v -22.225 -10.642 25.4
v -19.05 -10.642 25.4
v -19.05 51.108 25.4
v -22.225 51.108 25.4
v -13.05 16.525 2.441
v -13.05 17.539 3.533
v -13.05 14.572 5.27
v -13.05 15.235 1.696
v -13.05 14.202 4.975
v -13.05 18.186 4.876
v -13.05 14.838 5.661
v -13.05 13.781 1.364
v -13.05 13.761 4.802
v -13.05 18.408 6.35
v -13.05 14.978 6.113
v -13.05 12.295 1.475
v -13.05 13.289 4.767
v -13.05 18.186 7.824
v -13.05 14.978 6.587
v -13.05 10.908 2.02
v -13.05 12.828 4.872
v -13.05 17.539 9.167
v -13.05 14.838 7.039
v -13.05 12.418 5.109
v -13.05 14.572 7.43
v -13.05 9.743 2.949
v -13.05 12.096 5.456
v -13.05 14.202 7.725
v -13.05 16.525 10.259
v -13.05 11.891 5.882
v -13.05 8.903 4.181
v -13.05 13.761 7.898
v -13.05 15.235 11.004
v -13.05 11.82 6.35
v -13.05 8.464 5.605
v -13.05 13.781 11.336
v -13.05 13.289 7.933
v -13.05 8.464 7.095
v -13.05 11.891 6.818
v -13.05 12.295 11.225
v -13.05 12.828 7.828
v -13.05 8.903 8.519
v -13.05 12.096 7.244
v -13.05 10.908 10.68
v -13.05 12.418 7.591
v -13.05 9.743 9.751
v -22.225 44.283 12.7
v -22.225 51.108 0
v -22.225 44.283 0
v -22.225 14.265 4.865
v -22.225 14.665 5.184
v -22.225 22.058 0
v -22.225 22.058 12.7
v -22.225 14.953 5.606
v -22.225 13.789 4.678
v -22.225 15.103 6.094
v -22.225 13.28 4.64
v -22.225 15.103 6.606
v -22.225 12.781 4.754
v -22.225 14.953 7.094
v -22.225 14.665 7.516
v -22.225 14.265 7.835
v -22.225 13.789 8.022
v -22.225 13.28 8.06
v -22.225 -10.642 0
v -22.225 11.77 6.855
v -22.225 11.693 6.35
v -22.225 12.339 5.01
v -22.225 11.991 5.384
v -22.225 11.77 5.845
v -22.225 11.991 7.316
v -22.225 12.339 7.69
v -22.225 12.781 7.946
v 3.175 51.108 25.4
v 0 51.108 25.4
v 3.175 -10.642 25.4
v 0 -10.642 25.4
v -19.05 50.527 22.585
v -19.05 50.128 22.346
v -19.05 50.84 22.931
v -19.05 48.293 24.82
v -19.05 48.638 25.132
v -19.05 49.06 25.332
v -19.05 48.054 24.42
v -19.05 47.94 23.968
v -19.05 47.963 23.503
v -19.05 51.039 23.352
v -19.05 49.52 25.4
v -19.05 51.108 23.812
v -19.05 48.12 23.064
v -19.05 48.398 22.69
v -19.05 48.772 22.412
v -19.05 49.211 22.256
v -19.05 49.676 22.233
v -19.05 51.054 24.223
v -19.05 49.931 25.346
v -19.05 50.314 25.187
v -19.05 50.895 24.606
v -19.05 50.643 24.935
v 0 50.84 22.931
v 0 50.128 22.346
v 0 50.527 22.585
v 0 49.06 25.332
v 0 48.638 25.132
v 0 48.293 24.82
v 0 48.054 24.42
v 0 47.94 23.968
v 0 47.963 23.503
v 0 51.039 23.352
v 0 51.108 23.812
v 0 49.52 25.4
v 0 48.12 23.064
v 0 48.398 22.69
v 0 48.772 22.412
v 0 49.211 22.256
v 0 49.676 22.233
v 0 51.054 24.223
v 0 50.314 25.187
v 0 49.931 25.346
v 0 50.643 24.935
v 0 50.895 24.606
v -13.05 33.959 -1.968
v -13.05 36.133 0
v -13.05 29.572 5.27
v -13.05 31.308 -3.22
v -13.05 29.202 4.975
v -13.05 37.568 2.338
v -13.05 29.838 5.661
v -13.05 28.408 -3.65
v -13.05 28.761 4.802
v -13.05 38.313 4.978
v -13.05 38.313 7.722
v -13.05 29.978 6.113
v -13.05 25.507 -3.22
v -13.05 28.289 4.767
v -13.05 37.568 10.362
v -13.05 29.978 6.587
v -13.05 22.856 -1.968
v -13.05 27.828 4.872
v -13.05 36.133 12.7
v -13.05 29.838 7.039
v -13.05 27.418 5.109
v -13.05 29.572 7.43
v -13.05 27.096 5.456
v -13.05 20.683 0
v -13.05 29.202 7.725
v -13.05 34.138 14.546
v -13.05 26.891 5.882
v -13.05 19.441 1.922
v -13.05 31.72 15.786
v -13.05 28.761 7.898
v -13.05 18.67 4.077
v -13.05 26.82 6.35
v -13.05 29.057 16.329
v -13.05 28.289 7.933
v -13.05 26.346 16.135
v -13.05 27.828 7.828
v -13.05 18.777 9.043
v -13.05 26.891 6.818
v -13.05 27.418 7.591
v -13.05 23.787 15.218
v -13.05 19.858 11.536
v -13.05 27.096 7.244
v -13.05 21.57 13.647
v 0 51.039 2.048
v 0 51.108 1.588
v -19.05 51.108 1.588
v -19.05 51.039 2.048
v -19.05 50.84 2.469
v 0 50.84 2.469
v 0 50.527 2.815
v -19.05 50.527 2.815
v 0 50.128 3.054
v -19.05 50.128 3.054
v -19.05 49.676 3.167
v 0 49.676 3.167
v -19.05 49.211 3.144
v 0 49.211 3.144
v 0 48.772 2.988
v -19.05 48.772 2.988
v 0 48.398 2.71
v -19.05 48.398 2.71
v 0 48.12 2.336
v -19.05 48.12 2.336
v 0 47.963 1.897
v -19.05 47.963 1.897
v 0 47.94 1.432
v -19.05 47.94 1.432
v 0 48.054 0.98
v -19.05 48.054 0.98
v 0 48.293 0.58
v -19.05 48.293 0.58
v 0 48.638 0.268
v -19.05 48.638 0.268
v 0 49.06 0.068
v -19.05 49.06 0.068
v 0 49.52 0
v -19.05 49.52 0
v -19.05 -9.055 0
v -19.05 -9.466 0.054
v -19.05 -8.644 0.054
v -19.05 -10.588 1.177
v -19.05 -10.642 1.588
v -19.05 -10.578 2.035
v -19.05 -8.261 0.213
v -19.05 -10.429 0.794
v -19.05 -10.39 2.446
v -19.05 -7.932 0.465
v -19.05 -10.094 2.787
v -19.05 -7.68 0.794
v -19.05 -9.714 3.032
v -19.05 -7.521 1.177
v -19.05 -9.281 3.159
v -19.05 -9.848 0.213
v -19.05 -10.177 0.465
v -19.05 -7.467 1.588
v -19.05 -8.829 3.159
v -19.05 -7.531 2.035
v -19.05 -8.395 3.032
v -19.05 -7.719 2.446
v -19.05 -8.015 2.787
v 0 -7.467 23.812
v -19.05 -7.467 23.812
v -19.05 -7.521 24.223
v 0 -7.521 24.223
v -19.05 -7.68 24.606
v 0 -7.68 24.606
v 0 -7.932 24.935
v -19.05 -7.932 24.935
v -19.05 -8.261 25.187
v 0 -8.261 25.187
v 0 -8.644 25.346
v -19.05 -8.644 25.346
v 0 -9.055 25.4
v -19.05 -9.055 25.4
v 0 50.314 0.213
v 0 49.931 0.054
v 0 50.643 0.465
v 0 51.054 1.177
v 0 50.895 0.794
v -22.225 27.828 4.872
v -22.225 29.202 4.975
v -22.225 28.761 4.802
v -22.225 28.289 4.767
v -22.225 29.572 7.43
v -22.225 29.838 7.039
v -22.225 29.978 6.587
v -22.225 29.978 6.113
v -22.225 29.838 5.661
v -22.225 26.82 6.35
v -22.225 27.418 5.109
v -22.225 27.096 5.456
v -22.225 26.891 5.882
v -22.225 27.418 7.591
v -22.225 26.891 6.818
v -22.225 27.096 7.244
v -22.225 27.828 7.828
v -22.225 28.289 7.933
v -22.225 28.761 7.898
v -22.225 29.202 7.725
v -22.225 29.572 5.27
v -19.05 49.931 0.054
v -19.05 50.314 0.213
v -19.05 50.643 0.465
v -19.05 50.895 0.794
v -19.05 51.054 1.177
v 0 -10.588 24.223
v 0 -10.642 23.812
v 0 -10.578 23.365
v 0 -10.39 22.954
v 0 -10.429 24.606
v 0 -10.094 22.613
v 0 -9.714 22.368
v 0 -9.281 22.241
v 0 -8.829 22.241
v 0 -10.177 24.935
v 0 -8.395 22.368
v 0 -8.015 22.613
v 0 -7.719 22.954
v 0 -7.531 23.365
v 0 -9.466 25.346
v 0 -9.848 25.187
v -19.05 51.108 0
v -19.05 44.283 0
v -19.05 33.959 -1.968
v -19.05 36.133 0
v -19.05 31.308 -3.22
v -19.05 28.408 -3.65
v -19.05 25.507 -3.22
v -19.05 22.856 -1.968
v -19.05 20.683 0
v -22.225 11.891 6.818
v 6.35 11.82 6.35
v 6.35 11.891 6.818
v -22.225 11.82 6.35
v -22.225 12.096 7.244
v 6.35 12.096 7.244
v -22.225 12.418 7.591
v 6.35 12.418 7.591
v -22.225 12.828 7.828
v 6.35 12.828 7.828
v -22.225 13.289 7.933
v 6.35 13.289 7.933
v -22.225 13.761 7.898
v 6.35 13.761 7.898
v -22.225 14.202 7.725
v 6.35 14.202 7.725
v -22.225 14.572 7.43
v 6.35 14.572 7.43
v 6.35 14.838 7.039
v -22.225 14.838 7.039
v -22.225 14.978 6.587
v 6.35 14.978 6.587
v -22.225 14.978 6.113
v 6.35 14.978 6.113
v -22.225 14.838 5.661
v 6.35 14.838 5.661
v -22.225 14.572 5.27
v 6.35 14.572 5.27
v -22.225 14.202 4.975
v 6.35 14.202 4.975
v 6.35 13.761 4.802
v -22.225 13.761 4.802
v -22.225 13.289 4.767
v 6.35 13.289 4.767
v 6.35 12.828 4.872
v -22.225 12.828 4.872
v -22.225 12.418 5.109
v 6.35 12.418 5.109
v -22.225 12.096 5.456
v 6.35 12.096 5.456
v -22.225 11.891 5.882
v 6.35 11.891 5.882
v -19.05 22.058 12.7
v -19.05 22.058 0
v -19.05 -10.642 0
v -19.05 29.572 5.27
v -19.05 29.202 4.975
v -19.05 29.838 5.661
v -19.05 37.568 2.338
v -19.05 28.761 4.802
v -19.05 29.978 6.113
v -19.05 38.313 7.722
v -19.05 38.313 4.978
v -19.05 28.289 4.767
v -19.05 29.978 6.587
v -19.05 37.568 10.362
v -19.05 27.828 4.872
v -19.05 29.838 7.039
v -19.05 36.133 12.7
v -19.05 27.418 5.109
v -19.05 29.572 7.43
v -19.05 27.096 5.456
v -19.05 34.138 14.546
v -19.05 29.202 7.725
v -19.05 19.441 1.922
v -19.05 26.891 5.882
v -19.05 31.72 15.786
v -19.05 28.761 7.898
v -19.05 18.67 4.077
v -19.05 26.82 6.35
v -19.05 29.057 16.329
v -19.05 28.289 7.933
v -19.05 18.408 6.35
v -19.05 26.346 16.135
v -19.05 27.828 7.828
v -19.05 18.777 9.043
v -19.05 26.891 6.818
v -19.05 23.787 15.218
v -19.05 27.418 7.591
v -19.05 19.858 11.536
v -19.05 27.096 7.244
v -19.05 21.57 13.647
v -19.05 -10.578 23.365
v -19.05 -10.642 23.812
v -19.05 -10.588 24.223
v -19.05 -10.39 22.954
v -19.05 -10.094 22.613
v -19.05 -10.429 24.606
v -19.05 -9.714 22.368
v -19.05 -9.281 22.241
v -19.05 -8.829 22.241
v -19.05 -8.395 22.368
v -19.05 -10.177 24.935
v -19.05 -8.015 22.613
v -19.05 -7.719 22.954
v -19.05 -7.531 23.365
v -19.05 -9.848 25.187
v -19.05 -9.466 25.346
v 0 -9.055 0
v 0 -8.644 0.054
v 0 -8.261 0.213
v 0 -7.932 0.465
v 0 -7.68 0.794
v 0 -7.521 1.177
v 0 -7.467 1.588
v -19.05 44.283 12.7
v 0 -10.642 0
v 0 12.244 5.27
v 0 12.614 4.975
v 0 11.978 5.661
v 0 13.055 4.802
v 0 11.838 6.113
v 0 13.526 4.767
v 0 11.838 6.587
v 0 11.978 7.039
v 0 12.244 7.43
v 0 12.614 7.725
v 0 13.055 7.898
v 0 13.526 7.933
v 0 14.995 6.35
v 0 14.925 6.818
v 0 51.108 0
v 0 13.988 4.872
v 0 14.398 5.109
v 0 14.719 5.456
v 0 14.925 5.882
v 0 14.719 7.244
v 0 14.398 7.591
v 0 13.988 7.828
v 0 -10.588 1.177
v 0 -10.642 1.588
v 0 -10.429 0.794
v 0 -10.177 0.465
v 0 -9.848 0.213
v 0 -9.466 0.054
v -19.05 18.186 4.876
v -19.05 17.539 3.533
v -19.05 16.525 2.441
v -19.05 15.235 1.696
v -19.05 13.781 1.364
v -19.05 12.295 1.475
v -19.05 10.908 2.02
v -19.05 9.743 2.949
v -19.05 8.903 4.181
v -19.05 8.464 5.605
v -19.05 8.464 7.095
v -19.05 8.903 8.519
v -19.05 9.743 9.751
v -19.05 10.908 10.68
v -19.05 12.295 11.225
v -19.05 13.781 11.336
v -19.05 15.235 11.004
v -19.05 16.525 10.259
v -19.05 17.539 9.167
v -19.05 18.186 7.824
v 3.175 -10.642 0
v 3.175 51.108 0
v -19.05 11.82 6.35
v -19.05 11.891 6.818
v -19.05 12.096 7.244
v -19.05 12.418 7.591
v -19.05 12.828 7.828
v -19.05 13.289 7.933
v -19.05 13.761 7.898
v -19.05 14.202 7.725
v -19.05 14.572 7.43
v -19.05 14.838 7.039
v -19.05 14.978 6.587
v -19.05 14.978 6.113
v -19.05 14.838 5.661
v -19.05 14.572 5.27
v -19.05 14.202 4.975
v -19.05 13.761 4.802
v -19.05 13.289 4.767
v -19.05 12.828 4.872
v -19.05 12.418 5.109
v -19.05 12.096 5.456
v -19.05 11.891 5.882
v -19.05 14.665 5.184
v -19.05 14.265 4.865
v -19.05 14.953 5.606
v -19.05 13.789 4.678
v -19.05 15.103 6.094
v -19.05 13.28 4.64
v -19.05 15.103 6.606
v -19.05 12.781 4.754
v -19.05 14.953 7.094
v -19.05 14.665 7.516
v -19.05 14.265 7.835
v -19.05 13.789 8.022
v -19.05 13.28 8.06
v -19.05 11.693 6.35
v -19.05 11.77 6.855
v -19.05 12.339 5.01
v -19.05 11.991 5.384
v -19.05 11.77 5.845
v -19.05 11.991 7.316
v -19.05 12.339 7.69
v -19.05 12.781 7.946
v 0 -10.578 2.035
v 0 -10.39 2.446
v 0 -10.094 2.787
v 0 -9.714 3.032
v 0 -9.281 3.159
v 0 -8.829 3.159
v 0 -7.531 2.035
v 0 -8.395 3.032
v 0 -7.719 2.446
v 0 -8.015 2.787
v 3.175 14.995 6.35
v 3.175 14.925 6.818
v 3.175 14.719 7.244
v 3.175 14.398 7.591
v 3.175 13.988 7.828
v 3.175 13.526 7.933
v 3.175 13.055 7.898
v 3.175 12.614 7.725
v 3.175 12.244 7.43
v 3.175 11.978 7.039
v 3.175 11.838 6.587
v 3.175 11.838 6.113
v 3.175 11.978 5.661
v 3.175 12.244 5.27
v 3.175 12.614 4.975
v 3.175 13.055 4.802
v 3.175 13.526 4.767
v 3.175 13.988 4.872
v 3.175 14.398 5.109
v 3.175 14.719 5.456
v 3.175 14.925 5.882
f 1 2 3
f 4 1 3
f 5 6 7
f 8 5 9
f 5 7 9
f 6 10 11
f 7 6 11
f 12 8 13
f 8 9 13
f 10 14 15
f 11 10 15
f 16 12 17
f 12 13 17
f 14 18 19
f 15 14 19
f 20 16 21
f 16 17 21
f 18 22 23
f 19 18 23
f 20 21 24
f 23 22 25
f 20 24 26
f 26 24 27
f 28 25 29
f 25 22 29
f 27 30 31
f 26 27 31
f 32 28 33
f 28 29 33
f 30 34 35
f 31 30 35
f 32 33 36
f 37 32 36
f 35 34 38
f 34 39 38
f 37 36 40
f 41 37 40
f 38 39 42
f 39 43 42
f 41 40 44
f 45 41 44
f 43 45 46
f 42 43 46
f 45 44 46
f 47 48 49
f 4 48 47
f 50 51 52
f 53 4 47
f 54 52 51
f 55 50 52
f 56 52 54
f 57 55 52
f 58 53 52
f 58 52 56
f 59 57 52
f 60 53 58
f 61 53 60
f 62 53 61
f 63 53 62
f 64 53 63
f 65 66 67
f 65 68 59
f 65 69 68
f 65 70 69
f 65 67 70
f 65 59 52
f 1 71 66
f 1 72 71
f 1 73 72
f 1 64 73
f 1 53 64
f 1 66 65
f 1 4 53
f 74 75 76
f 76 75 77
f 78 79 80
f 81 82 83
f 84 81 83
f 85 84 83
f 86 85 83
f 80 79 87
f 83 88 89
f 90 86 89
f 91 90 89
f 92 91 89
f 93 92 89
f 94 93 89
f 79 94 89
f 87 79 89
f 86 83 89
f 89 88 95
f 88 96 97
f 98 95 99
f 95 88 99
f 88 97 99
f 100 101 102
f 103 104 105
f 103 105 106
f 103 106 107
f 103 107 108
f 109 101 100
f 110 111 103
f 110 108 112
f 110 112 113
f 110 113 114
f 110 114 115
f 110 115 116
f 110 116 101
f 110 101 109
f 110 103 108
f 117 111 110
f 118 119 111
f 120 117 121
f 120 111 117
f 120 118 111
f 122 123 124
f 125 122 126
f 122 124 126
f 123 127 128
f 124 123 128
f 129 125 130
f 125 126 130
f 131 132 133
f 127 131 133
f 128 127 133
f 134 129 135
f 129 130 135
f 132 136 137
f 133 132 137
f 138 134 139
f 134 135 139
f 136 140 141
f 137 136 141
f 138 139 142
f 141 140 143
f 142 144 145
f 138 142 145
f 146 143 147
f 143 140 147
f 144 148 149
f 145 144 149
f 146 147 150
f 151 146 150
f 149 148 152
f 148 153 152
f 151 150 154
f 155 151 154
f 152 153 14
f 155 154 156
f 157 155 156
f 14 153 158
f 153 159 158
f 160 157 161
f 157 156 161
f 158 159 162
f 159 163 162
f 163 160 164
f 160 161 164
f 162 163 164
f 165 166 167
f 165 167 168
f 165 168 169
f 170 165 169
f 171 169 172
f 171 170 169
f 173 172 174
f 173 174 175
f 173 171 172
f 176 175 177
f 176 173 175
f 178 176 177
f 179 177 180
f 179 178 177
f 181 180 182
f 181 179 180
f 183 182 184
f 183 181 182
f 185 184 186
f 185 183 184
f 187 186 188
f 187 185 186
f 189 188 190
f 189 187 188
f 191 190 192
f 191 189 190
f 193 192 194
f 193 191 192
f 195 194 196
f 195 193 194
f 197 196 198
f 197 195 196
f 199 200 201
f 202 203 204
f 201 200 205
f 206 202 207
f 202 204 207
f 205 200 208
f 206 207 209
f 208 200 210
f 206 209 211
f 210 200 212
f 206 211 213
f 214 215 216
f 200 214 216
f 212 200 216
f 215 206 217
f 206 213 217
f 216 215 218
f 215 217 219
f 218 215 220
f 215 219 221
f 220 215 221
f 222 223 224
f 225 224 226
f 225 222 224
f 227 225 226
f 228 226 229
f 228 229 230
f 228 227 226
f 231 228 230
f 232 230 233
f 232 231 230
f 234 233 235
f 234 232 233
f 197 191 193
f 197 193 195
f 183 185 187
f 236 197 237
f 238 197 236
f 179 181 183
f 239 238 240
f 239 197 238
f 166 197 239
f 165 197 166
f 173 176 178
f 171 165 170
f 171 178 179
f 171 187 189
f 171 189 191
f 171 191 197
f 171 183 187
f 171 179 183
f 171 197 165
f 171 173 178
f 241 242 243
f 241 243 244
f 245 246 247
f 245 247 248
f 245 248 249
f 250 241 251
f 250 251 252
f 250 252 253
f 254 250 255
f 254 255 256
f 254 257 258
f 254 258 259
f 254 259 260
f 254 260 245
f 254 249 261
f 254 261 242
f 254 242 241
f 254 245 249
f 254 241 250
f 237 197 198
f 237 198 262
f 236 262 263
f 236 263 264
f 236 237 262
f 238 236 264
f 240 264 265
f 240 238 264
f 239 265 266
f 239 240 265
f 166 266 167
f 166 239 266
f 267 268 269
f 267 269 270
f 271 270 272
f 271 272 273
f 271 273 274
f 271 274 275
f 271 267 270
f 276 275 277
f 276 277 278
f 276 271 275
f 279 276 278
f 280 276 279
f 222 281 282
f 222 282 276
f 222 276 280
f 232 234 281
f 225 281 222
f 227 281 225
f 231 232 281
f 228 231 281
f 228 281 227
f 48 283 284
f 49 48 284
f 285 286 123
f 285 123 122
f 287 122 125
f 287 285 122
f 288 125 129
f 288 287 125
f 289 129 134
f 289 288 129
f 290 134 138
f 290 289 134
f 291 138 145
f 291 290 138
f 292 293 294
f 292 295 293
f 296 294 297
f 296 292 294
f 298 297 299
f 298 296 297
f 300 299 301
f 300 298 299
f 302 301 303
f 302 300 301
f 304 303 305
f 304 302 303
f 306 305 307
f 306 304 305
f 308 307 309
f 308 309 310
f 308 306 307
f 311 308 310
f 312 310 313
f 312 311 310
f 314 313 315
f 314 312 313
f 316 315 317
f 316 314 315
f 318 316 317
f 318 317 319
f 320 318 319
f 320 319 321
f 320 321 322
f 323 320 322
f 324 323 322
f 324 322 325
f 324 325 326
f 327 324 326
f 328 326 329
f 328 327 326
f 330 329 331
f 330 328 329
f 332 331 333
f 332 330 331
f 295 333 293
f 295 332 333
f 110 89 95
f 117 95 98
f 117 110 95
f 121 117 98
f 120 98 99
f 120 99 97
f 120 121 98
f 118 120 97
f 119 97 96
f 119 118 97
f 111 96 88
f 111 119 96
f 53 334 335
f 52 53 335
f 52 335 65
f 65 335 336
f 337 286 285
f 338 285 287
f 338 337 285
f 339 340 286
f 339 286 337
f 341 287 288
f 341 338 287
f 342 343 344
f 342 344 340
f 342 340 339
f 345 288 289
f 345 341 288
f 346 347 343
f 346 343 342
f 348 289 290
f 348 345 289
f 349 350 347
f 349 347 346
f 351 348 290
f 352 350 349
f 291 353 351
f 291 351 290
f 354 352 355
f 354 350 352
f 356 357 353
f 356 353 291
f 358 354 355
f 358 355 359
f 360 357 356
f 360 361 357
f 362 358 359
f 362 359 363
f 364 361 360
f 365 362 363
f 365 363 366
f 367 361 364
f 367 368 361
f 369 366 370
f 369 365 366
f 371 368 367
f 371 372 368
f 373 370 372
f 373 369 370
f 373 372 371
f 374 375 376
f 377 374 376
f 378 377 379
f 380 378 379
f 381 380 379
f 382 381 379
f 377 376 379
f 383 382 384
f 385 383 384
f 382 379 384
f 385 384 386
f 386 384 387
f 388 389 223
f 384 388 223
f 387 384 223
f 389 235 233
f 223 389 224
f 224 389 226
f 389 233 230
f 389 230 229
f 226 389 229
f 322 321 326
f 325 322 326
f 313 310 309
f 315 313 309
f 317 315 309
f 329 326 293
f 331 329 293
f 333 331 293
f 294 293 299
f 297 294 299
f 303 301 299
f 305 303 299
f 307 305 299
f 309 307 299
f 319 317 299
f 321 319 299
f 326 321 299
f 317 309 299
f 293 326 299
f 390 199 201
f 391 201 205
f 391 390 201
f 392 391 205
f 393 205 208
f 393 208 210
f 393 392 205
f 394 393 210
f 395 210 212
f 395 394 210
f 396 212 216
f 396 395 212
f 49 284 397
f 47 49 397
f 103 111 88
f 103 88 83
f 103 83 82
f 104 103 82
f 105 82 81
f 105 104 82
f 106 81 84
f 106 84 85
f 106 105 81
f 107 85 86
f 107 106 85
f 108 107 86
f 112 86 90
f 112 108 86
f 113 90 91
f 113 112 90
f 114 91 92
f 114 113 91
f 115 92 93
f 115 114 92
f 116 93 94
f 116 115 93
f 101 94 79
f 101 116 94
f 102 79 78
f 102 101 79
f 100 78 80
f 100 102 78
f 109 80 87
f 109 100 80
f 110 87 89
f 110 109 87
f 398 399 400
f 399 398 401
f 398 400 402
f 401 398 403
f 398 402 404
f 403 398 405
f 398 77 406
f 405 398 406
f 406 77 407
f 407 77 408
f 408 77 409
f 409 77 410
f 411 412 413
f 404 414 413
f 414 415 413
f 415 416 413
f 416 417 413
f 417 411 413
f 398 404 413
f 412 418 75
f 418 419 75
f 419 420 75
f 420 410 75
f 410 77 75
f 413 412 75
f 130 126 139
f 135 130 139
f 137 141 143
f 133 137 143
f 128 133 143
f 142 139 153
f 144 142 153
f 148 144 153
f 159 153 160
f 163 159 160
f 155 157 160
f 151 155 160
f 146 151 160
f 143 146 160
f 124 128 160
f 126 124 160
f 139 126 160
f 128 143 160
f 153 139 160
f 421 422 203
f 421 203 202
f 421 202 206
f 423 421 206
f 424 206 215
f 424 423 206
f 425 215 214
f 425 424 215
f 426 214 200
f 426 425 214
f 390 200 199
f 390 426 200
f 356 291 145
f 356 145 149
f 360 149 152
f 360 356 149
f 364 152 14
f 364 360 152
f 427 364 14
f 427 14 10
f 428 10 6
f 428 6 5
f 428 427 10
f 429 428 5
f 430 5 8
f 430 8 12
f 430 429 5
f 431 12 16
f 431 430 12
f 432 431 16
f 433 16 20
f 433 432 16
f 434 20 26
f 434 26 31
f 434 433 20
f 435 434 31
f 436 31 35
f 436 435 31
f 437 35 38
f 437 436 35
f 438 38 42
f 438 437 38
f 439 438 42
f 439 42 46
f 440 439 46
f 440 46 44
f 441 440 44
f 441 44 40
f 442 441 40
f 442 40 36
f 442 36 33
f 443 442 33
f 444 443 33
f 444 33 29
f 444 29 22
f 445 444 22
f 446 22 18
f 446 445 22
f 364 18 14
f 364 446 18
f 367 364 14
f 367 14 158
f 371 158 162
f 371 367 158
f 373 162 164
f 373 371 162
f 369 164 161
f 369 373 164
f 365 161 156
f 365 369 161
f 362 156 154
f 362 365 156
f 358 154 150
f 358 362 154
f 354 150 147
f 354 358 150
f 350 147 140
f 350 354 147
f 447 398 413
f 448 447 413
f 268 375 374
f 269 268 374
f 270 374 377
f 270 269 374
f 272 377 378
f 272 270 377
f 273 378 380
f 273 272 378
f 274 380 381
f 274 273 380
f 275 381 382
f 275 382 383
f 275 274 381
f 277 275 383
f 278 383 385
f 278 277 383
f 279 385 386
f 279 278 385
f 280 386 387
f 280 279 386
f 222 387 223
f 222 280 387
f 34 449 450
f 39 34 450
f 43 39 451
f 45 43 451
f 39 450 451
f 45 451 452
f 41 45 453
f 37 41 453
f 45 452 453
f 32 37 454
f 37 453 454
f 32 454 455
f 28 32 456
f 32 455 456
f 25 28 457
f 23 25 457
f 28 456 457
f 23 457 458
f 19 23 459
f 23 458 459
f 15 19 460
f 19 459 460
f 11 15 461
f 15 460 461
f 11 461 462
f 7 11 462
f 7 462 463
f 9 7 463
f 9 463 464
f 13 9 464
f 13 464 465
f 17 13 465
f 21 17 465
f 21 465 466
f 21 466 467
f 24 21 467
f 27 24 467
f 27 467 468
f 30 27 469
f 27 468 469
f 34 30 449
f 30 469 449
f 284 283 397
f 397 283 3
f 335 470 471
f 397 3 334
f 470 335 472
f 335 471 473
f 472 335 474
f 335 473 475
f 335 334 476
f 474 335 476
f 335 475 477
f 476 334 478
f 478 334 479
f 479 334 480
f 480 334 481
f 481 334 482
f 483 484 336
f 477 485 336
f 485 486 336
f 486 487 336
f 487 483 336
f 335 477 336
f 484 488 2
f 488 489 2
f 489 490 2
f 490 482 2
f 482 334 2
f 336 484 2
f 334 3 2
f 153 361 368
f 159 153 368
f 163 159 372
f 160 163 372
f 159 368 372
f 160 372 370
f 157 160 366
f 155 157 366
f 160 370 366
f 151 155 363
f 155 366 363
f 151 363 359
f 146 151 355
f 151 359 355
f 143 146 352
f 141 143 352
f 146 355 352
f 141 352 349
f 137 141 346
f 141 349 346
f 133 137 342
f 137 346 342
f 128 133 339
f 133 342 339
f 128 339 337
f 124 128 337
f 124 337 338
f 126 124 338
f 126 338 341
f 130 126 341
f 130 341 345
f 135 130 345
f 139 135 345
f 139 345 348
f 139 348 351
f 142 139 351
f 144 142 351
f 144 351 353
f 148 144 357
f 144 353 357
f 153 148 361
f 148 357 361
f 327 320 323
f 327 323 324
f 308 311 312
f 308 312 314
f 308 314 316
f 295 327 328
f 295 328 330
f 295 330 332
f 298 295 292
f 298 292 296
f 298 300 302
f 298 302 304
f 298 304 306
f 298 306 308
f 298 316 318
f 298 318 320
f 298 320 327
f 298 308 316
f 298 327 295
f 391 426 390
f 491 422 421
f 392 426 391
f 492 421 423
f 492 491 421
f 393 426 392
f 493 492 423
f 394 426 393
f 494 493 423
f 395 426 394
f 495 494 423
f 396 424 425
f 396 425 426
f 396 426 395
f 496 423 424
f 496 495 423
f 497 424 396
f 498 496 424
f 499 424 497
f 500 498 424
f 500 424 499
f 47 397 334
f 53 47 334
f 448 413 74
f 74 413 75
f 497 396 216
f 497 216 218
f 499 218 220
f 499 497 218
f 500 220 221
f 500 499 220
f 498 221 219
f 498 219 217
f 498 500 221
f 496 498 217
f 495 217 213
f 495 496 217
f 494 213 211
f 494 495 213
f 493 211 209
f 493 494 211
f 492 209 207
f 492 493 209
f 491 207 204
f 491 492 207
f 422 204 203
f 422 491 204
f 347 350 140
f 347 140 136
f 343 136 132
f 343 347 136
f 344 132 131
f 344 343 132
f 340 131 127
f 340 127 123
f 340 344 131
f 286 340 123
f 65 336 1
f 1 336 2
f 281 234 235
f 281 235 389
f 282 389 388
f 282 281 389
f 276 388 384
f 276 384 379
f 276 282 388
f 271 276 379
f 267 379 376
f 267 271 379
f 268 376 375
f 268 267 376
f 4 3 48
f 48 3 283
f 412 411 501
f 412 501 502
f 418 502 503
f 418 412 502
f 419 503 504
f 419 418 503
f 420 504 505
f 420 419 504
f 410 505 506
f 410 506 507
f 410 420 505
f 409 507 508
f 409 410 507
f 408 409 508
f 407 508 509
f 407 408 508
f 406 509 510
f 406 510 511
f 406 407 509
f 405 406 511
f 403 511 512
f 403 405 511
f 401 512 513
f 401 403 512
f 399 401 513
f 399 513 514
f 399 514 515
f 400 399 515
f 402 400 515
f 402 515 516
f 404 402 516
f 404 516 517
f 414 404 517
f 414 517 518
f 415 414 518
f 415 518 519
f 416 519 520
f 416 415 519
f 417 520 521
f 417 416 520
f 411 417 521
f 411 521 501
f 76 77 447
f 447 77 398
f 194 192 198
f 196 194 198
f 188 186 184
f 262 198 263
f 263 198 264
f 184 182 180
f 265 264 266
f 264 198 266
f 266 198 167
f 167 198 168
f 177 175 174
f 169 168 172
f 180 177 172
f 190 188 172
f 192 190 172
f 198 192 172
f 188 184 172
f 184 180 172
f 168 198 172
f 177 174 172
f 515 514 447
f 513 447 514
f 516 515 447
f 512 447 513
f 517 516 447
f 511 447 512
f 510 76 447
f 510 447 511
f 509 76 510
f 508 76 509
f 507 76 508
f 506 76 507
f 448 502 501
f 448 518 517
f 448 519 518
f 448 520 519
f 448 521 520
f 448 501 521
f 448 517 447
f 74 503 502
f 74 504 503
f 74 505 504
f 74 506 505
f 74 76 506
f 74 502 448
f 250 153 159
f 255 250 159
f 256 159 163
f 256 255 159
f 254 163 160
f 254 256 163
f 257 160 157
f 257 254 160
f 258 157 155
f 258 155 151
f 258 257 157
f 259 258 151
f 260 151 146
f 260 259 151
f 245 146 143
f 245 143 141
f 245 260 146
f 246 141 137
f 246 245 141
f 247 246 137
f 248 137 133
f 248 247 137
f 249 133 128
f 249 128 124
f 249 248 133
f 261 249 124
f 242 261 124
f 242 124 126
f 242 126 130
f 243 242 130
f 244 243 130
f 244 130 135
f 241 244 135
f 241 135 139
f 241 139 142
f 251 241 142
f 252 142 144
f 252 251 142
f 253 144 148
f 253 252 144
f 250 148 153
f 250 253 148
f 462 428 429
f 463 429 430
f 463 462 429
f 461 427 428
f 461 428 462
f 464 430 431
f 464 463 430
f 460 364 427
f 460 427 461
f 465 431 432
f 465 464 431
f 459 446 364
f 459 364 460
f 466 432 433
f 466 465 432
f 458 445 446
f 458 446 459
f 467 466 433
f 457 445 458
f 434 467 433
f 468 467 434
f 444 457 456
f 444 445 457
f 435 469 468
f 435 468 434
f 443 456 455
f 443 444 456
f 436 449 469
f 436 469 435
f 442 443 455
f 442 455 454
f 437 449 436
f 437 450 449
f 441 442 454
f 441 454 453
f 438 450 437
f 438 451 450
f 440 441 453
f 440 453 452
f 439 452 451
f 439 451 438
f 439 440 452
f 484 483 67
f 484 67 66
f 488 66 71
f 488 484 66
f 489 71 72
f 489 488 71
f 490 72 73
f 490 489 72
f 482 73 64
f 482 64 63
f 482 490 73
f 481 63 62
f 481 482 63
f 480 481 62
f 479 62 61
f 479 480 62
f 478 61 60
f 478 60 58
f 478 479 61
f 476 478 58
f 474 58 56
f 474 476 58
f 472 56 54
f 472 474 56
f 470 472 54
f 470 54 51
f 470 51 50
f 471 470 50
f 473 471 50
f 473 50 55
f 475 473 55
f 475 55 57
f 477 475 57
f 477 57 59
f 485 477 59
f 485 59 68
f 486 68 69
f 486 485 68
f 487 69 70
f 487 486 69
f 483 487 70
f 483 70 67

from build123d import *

# Parameters (mm, degrees)
F0_R      = 5
F0_R_2    = 1.8415
F0_R_3    = 1.5875
F1_DEPTH  = 3.175
F2_DEPTH  = 19.05
F3_R      = 1.7145
F4_DEPTH  = 3.175
F3_R_2    = 1.5875
F5_DEPTH  = 3.175
F6_DEPTH  = 6
F3_R_3    = 1.8415
F7_DEPTH  = 6
F8_DEPTH  = 3.175
F9_DEPTH  = 25.4
F10_DEPTH = 6


# Not quite as in the source:
# - a feature names something its author has since deleted; it is built from what else it names


with BuildPart() as f1:
    # F0 (on Right) → F1 (new body)
    with BuildSketch(Plane.YZ):
        with BuildLine():
            ThreePointArc((18.4078367749, 6.35), (25.0352423421, 15.7641174197), (36.1329581332, 12.7))
            Line((36.1329581332, 12.7), (44.2828367749, 12.7))
            Line((44.2828367749, 12.7), (44.2828367749, 0))
            Line((44.2828367749, 0), (49.5203367749, 0))
            ThreePointArc((49.5203367749, 0), (48.3978047598, 2.7100320151), (51.1078367749, 1.5875))
            Line((51.1078367749, 1.5875), (51.1078367749, 23.8125))
            ThreePointArc((51.1078367749, 23.8125), (48.3978047598, 22.6899679849), (49.5203367749, 25.4))
            Line((49.5203367749, 25.4), (41.8216693056, 25.4))
            Line((41.8216693056, 25.4), (35.8211970083, 25.4))
            Line((35.8211970083, 25.4), (-9.0546632251, 25.4))
            ThreePointArc((-9.0546632251, 25.4), (-7.9321312099, 24.9350320151), (-7.4671632251, 23.8125))
            ThreePointArc((-7.4671632251, 23.8125), (-9.0546632251, 22.225), (-10.6421632251, 23.8125))
            Line((-10.6421632251, 23.8125), (-10.6421632251, 1.5875))
            ThreePointArc((-10.6421632251, 1.5875), (-9.0546632251, 3.175), (-7.4671632251, 1.5875))
            ThreePointArc((-7.4671632251, 1.5875), (-7.9321312099, 0.4649679849), (-9.0546632251, 0))
            Line((-9.0546632251, 0), (20.6827154167, 0))
            ThreePointArc((20.6827154167, 0), (18.9937193553, 2.9774055671), (18.4078367749, 6.35))
        make_face()
        with Locations((13.4078367749, 6.35)):
            Circle(F0_R, mode=Mode.SUBTRACT)
        with BuildLine():
            ThreePointArc((36.1329581332, 0), (37.8219541946, 2.9774055671), (38.4078367749, 6.35))
            ThreePointArc((38.4078367749, 6.35), (37.8219541946, 9.7225944329), (36.1329581332, 12.7))
            Line((36.1329581332, 12.7), (22.0578367749, 12.7))
            Line((22.0578367749, 12.7), (22.0578367749, 0))
            Line((22.0578367749, 0), (36.1329581332, 0))
        make_face()
        with Locations((28.4078367749, 6.35)):
            Circle(F0_R_2, mode=Mode.SUBTRACT)
        with BuildLine():
            ThreePointArc((36.1329581332, 12.7), (37.8219541946, 9.7225944329), (38.4078367749, 6.35))
            ThreePointArc((38.4078367749, 6.35), (37.8219541946, 2.9774055671), (36.1329581332, 0))
            Line((36.1329581332, 0), (43.4878367749, 0))
            Line((43.4878367749, 0), (44.2828367749, 0))
            Line((44.2828367749, 0), (44.2828367749, 12.7))
            Line((44.2828367749, 12.7), (36.1329581332, 12.7))
        make_face()
        with Locations((13.4078367749, 6.35)):
            Circle(F0_R)
        with Locations((13.4078367749, 6.35)):
            Circle(F0_R_3, mode=Mode.SUBTRACT)
        with BuildLine():
            Line((22.0578367749, 12.7), (36.1329581332, 12.7))
            ThreePointArc((36.1329581332, 12.7), (25.0352423421, 15.7641174197), (18.4078367749, 6.35))
            ThreePointArc((18.4078367749, 6.35), (18.9937193553, 2.9774055671), (20.6827154167, 0))
            Line((20.6827154167, 0), (22.0578367749, 0))
            Line((22.0578367749, 0), (22.0578367749, 12.7))
        make_face()
        with Locations((28.4078367749, 6.35)):
            Circle(F0_R_2)
        with Locations((28.4078367749, 6.35)):
            Circle(F0_R_3, mode=Mode.SUBTRACT)
        with BuildLine():
            ThreePointArc((-10.6421632251, 1.5875), (-10.1771952402, 0.4649679849), (-9.0546632251, 0))
            ThreePointArc((-9.0546632251, 0), (-7.9321312099, 0.4649679849), (-7.4671632251, 1.5875))
            ThreePointArc((-7.4671632251, 1.5875), (-9.0546632251, 3.175), (-10.6421632251, 1.5875))
        make_face()
        with BuildLine():
            ThreePointArc((51.1078367749, 1.5875), (48.3978047598, 2.7100320151), (49.5203367749, 0))
            ThreePointArc((49.5203367749, 0), (50.6428687901, 0.4649679849), (51.1078367749, 1.5875))
        make_face()
        with BuildLine():
            ThreePointArc((-9.0546632251, 25.4), (-10.1771952402, 24.9350320151), (-10.6421632251, 23.8125))
            ThreePointArc((-10.6421632251, 23.8125), (-9.0546632251, 22.225), (-7.4671632251, 23.8125))
            ThreePointArc((-7.4671632251, 23.8125), (-7.9321312099, 24.9350320151), (-9.0546632251, 25.4))
        make_face()
        with BuildLine():
            ThreePointArc((49.5203367749, 25.4), (48.3978047598, 22.6899679849), (51.1078367749, 23.8125))
            ThreePointArc((51.1078367749, 23.8125), (50.6428687901, 24.9350320151), (49.5203367749, 25.4))
        make_face()
        with Locations((28.4078367749, 6.35)):
            Circle(F0_R_3)
        with BuildLine():
            Line((-10.6421632251, 0), (-9.0546632251, 0))
            ThreePointArc((-9.0546632251, 0), (-10.1771952402, 0.4649679849), (-10.6421632251, 1.5875))
            Line((-10.6421632251, 1.5875), (-10.6421632251, 0))
        make_face()
        with BuildLine():
            ThreePointArc((51.1078367749, 1.5875), (50.6428687901, 0.4649679849), (49.5203367749, 0))
            Line((49.5203367749, 0), (50.2833090723, 0))
            Line((50.2833090723, 0), (51.1078367749, 0))
            Line((51.1078367749, 0), (51.1078367749, 1.5875))
        make_face()
        with BuildLine():
            Line((-10.6421632251, 25.4), (-10.6421632251, 23.8125))
            ThreePointArc((-10.6421632251, 23.8125), (-10.1771952402, 24.9350320151), (-9.0546632251, 25.4))
            Line((-9.0546632251, 25.4), (-10.6421632251, 25.4))
        make_face()
        with BuildLine():
            ThreePointArc((49.5203367749, 25.4), (50.6428687901, 24.9350320151), (51.1078367749, 23.8125))
            Line((51.1078367749, 23.8125), (51.1078367749, 25.4))
            Line((51.1078367749, 25.4), (49.5203367749, 25.4))
        make_face()
    extrude(amount=F1_DEPTH)


with BuildPart() as f2:
    # F0 (on Right) → F2 (new body)
    with BuildSketch(Plane.YZ):
        with BuildLine():
            ThreePointArc((-10.6421632251, 1.5875), (-10.1771952402, 0.4649679849), (-9.0546632251, 0))
            ThreePointArc((-9.0546632251, 0), (-7.9321312099, 0.4649679849), (-7.4671632251, 1.5875))
            ThreePointArc((-7.4671632251, 1.5875), (-9.0546632251, 3.175), (-10.6421632251, 1.5875))
        make_face()
    extrude(amount=-F2_DEPTH)


with BuildPart() as f2b:
    # F0 (on Right) → F2, piece 2 (new body)
    with BuildSketch(Plane.YZ):
        with BuildLine():
            ThreePointArc((51.1078367749, 1.5875), (48.3978047598, 2.7100320151), (49.5203367749, 0))
            ThreePointArc((49.5203367749, 0), (50.6428687901, 0.4649679849), (51.1078367749, 1.5875))
        make_face()
    extrude(amount=-F2_DEPTH)


with BuildPart() as f2c:
    # F0 (on Right) → F2, piece 3 (new body)
    with BuildSketch(Plane.YZ):
        with BuildLine():
            ThreePointArc((-9.0546632251, 25.4), (-10.1771952402, 24.9350320151), (-10.6421632251, 23.8125))
            ThreePointArc((-10.6421632251, 23.8125), (-9.0546632251, 22.225), (-7.4671632251, 23.8125))
            ThreePointArc((-7.4671632251, 23.8125), (-7.9321312099, 24.9350320151), (-9.0546632251, 25.4))
        make_face()
    extrude(amount=-F2_DEPTH)


with BuildPart() as f2d:
    # F0 (on Right) → F2, piece 4 (new body)
    with BuildSketch(Plane.YZ):
        with BuildLine():
            ThreePointArc((49.5203367749, 25.4), (48.3978047598, 22.6899679849), (51.1078367749, 23.8125))
            ThreePointArc((51.1078367749, 23.8125), (50.6428687901, 24.9350320151), (49.5203367749, 25.4))
        make_face()
    extrude(amount=-F2_DEPTH)


with BuildPart() as f4:
    # F3 (on face) → F4 (new body)
    with BuildSketch(Plane(origin=(-19.05, 0, 0), x_dir=(0, -1, 0), z_dir=(-1, 0, 0))):
        with BuildLine():
            Line((10.6421632251, 25.4), (-49.5203367749, 25.4))
            ThreePointArc((-49.5203367749, 25.4), (-48.3978047598, 24.9350320151), (-47.9328367749, 23.8125))
            ThreePointArc((-47.9328367749, 23.8125), (-49.5203367749, 22.225), (-51.1078367749, 23.8125))
            Line((-51.1078367749, 23.8125), (-51.1078367749, 0))
            Line((-51.1078367749, 0), (-44.2828367749, 0))
            Line((-44.2828367749, 0), (-44.2828367749, 12.7))
            Line((-44.2828367749, 12.7), (-36.1329581332, 12.7))
            ThreePointArc((-36.1329581332, 12.7), (-25.0352423421, 15.7641174197), (-18.4078367749, 6.35))
            ThreePointArc((-18.4078367749, 6.35), (-18.9937193553, 2.9774055671), (-20.6827154167, 0))
            Line((-20.6827154167, 0), (10.6421632251, 0))
            Line((10.6421632251, 0), (10.6421632251, 25.4))
        make_face()
        with BuildLine():
            ThreePointArc((-8.4078367749, 6.35), (-13.4078367749, 1.35), (-18.4078367749, 6.35))
            ThreePointArc((-18.4078367749, 6.35), (-13.4078367749, 11.35), (-8.4078367749, 6.35))
        make_face(mode=Mode.SUBTRACT)
        with BuildLine():
            ThreePointArc((-8.4078367749, 6.35), (-13.4078367749, 11.35), (-18.4078367749, 6.35))
            ThreePointArc((-18.4078367749, 6.35), (-13.4078367749, 1.35), (-8.4078367749, 6.35))
        make_face()
        with Locations((-13.4078367749, 6.35)):
            Circle(F3_R, mode=Mode.SUBTRACT)
        with BuildLine():
            Line((-22.0578367749, 0), (-20.6827154167, 0))
            ThreePointArc((-20.6827154167, 0), (-18.9937193553, 2.9774055671), (-18.4078367749, 6.35))
            ThreePointArc((-18.4078367749, 6.35), (-25.0352423421, 15.7641174197), (-36.1329581332, 12.7))
            Line((-36.1329581332, 12.7), (-22.0578367749, 12.7))
            Line((-22.0578367749, 12.7), (-22.0578367749, 6.35))
            Line((-22.0578367749, 6.35), (-22.0578367749, 0))
        make_face()
        with BuildLine():
            ThreePointArc((-47.9328367749, 23.8125), (-48.3978047598, 24.9350320151), (-49.5203367749, 25.4))
            ThreePointArc((-49.5203367749, 25.4), (-50.6428687901, 24.9350320151), (-51.1078367749, 23.8125))
            ThreePointArc((-51.1078367749, 23.8125), (-49.5203367749, 22.225), (-47.9328367749, 23.8125))
        make_face()
        with BuildLine():
            Line((-49.5203367749, 25.4), (-51.1078367749, 25.4))
            Line((-51.1078367749, 25.4), (-51.1078367749, 23.8125))
            ThreePointArc((-51.1078367749, 23.8125), (-50.6428687901, 24.9350320151), (-49.5203367749, 25.4))
        make_face()
    extrude(amount=F4_DEPTH)


with BuildPart() as f5:
    # F3 (on face) → F5 (new body)
    with BuildSketch(Plane(origin=(-19.05, 0, 0), x_dir=(0, -1, 0), z_dir=(-1, 0, 0))):
        with Locations((-28.4078367749, 6.35)):
            Circle(F3_R_2)
    extrude(amount=F5_DEPTH)

    # F3 (on face) → F6 (join)
    with BuildSketch(Plane(origin=(-19.05, 0, 0), x_dir=(0, -1, 0), z_dir=(-1, 0, 0))):
        with Locations((-28.4078367749, 6.35)):
            Circle(F3_R_2)
    extrude(amount=-F6_DEPTH)


with BuildPart() as f7:
    # F3 (on face) → F7 (new body)
    with BuildSketch(Plane(origin=(-19.05, 0, 0), x_dir=(0, -1, 0), z_dir=(-1, 0, 0))):
        with BuildLine():
            ThreePointArc((-36.1329581332, 12.7), (-38.4078367749, 6.35), (-36.1329581332, 0))
            Line((-36.1329581332, 0), (-22.0578367749, 0))
            Line((-22.0578367749, 0), (-22.0578367749, 6.35))
            Line((-22.0578367749, 6.35), (-22.0578367749, 12.7))
            Line((-22.0578367749, 12.7), (-36.1329581332, 12.7))
        make_face()
        with Locations((-28.4078367749, 6.35)):
            Circle(F3_R_3, mode=Mode.SUBTRACT)
        with BuildLine():
            Line((-22.0578367749, 0), (-20.6827154167, 0))
            ThreePointArc((-20.6827154167, 0), (-18.9937193553, 2.9774055671), (-18.4078367749, 6.35))
            ThreePointArc((-18.4078367749, 6.35), (-25.0352423421, 15.7641174197), (-36.1329581332, 12.7))
            Line((-36.1329581332, 12.7), (-22.0578367749, 12.7))
            Line((-22.0578367749, 12.7), (-22.0578367749, 6.35))
            Line((-22.0578367749, 6.35), (-22.0578367749, 0))
        make_face()
        with BuildLine():
            ThreePointArc((-36.1329581332, 0), (-28.4078367749, -3.65), (-20.6827154167, 0))
            Line((-20.6827154167, 0), (-22.0578367749, 0))
            Line((-22.0578367749, 0), (-36.1329581332, 0))
        make_face()
        with Locations((-28.4078367749, 6.35)):
            Circle(F3_R_3)
        with Locations((-28.4078367749, 6.35)):
            Circle(F3_R_2, mode=Mode.SUBTRACT)
    extrude(amount=-F7_DEPTH)


with BuildPart() as f8:
    # F3 (on face) → F8 (new body)
    with BuildSketch(Plane(origin=(-19.05, 0, 0), x_dir=(0, -1, 0), z_dir=(-1, 0, 0))):
        with Locations((-13.4078367749, 6.35)):
            Circle(F3_R_2)
    extrude(amount=F8_DEPTH)

    # F3 (on face) → F9 (join)
    with BuildSketch(Plane(origin=(-19.05, 0, 0), x_dir=(0, -1, 0), z_dir=(-1, 0, 0))):
        with Locations((-13.4078367749, 6.35)):
            Circle(F3_R_2)
    extrude(amount=-F9_DEPTH)


with BuildPart() as f10:
    # F3 (on face) → F10 (new body)
    with BuildSketch(Plane(origin=(-19.05, 0, 0), x_dir=(0, -1, 0), z_dir=(-1, 0, 0))):
        with BuildLine():
            ThreePointArc((-8.4078367749, 6.35), (-13.4078367749, 11.35), (-18.4078367749, 6.35))
            ThreePointArc((-18.4078367749, 6.35), (-13.4078367749, 1.35), (-8.4078367749, 6.35))
        make_face()
        with Locations((-13.4078367749, 6.35)):
            Circle(F3_R, mode=Mode.SUBTRACT)
        with Locations((-13.4078367749, 6.35)):
            Circle(F3_R)
        with Locations((-13.4078367749, 6.35)):
            Circle(F3_R_2, mode=Mode.SUBTRACT)
    extrude(amount=-F10_DEPTH)


solid = Compound([f1.part, f2.part, f2b.part, f2c.part, f2d.part, f4.part, f5.part, f7.part, f8.part, f10.part])
